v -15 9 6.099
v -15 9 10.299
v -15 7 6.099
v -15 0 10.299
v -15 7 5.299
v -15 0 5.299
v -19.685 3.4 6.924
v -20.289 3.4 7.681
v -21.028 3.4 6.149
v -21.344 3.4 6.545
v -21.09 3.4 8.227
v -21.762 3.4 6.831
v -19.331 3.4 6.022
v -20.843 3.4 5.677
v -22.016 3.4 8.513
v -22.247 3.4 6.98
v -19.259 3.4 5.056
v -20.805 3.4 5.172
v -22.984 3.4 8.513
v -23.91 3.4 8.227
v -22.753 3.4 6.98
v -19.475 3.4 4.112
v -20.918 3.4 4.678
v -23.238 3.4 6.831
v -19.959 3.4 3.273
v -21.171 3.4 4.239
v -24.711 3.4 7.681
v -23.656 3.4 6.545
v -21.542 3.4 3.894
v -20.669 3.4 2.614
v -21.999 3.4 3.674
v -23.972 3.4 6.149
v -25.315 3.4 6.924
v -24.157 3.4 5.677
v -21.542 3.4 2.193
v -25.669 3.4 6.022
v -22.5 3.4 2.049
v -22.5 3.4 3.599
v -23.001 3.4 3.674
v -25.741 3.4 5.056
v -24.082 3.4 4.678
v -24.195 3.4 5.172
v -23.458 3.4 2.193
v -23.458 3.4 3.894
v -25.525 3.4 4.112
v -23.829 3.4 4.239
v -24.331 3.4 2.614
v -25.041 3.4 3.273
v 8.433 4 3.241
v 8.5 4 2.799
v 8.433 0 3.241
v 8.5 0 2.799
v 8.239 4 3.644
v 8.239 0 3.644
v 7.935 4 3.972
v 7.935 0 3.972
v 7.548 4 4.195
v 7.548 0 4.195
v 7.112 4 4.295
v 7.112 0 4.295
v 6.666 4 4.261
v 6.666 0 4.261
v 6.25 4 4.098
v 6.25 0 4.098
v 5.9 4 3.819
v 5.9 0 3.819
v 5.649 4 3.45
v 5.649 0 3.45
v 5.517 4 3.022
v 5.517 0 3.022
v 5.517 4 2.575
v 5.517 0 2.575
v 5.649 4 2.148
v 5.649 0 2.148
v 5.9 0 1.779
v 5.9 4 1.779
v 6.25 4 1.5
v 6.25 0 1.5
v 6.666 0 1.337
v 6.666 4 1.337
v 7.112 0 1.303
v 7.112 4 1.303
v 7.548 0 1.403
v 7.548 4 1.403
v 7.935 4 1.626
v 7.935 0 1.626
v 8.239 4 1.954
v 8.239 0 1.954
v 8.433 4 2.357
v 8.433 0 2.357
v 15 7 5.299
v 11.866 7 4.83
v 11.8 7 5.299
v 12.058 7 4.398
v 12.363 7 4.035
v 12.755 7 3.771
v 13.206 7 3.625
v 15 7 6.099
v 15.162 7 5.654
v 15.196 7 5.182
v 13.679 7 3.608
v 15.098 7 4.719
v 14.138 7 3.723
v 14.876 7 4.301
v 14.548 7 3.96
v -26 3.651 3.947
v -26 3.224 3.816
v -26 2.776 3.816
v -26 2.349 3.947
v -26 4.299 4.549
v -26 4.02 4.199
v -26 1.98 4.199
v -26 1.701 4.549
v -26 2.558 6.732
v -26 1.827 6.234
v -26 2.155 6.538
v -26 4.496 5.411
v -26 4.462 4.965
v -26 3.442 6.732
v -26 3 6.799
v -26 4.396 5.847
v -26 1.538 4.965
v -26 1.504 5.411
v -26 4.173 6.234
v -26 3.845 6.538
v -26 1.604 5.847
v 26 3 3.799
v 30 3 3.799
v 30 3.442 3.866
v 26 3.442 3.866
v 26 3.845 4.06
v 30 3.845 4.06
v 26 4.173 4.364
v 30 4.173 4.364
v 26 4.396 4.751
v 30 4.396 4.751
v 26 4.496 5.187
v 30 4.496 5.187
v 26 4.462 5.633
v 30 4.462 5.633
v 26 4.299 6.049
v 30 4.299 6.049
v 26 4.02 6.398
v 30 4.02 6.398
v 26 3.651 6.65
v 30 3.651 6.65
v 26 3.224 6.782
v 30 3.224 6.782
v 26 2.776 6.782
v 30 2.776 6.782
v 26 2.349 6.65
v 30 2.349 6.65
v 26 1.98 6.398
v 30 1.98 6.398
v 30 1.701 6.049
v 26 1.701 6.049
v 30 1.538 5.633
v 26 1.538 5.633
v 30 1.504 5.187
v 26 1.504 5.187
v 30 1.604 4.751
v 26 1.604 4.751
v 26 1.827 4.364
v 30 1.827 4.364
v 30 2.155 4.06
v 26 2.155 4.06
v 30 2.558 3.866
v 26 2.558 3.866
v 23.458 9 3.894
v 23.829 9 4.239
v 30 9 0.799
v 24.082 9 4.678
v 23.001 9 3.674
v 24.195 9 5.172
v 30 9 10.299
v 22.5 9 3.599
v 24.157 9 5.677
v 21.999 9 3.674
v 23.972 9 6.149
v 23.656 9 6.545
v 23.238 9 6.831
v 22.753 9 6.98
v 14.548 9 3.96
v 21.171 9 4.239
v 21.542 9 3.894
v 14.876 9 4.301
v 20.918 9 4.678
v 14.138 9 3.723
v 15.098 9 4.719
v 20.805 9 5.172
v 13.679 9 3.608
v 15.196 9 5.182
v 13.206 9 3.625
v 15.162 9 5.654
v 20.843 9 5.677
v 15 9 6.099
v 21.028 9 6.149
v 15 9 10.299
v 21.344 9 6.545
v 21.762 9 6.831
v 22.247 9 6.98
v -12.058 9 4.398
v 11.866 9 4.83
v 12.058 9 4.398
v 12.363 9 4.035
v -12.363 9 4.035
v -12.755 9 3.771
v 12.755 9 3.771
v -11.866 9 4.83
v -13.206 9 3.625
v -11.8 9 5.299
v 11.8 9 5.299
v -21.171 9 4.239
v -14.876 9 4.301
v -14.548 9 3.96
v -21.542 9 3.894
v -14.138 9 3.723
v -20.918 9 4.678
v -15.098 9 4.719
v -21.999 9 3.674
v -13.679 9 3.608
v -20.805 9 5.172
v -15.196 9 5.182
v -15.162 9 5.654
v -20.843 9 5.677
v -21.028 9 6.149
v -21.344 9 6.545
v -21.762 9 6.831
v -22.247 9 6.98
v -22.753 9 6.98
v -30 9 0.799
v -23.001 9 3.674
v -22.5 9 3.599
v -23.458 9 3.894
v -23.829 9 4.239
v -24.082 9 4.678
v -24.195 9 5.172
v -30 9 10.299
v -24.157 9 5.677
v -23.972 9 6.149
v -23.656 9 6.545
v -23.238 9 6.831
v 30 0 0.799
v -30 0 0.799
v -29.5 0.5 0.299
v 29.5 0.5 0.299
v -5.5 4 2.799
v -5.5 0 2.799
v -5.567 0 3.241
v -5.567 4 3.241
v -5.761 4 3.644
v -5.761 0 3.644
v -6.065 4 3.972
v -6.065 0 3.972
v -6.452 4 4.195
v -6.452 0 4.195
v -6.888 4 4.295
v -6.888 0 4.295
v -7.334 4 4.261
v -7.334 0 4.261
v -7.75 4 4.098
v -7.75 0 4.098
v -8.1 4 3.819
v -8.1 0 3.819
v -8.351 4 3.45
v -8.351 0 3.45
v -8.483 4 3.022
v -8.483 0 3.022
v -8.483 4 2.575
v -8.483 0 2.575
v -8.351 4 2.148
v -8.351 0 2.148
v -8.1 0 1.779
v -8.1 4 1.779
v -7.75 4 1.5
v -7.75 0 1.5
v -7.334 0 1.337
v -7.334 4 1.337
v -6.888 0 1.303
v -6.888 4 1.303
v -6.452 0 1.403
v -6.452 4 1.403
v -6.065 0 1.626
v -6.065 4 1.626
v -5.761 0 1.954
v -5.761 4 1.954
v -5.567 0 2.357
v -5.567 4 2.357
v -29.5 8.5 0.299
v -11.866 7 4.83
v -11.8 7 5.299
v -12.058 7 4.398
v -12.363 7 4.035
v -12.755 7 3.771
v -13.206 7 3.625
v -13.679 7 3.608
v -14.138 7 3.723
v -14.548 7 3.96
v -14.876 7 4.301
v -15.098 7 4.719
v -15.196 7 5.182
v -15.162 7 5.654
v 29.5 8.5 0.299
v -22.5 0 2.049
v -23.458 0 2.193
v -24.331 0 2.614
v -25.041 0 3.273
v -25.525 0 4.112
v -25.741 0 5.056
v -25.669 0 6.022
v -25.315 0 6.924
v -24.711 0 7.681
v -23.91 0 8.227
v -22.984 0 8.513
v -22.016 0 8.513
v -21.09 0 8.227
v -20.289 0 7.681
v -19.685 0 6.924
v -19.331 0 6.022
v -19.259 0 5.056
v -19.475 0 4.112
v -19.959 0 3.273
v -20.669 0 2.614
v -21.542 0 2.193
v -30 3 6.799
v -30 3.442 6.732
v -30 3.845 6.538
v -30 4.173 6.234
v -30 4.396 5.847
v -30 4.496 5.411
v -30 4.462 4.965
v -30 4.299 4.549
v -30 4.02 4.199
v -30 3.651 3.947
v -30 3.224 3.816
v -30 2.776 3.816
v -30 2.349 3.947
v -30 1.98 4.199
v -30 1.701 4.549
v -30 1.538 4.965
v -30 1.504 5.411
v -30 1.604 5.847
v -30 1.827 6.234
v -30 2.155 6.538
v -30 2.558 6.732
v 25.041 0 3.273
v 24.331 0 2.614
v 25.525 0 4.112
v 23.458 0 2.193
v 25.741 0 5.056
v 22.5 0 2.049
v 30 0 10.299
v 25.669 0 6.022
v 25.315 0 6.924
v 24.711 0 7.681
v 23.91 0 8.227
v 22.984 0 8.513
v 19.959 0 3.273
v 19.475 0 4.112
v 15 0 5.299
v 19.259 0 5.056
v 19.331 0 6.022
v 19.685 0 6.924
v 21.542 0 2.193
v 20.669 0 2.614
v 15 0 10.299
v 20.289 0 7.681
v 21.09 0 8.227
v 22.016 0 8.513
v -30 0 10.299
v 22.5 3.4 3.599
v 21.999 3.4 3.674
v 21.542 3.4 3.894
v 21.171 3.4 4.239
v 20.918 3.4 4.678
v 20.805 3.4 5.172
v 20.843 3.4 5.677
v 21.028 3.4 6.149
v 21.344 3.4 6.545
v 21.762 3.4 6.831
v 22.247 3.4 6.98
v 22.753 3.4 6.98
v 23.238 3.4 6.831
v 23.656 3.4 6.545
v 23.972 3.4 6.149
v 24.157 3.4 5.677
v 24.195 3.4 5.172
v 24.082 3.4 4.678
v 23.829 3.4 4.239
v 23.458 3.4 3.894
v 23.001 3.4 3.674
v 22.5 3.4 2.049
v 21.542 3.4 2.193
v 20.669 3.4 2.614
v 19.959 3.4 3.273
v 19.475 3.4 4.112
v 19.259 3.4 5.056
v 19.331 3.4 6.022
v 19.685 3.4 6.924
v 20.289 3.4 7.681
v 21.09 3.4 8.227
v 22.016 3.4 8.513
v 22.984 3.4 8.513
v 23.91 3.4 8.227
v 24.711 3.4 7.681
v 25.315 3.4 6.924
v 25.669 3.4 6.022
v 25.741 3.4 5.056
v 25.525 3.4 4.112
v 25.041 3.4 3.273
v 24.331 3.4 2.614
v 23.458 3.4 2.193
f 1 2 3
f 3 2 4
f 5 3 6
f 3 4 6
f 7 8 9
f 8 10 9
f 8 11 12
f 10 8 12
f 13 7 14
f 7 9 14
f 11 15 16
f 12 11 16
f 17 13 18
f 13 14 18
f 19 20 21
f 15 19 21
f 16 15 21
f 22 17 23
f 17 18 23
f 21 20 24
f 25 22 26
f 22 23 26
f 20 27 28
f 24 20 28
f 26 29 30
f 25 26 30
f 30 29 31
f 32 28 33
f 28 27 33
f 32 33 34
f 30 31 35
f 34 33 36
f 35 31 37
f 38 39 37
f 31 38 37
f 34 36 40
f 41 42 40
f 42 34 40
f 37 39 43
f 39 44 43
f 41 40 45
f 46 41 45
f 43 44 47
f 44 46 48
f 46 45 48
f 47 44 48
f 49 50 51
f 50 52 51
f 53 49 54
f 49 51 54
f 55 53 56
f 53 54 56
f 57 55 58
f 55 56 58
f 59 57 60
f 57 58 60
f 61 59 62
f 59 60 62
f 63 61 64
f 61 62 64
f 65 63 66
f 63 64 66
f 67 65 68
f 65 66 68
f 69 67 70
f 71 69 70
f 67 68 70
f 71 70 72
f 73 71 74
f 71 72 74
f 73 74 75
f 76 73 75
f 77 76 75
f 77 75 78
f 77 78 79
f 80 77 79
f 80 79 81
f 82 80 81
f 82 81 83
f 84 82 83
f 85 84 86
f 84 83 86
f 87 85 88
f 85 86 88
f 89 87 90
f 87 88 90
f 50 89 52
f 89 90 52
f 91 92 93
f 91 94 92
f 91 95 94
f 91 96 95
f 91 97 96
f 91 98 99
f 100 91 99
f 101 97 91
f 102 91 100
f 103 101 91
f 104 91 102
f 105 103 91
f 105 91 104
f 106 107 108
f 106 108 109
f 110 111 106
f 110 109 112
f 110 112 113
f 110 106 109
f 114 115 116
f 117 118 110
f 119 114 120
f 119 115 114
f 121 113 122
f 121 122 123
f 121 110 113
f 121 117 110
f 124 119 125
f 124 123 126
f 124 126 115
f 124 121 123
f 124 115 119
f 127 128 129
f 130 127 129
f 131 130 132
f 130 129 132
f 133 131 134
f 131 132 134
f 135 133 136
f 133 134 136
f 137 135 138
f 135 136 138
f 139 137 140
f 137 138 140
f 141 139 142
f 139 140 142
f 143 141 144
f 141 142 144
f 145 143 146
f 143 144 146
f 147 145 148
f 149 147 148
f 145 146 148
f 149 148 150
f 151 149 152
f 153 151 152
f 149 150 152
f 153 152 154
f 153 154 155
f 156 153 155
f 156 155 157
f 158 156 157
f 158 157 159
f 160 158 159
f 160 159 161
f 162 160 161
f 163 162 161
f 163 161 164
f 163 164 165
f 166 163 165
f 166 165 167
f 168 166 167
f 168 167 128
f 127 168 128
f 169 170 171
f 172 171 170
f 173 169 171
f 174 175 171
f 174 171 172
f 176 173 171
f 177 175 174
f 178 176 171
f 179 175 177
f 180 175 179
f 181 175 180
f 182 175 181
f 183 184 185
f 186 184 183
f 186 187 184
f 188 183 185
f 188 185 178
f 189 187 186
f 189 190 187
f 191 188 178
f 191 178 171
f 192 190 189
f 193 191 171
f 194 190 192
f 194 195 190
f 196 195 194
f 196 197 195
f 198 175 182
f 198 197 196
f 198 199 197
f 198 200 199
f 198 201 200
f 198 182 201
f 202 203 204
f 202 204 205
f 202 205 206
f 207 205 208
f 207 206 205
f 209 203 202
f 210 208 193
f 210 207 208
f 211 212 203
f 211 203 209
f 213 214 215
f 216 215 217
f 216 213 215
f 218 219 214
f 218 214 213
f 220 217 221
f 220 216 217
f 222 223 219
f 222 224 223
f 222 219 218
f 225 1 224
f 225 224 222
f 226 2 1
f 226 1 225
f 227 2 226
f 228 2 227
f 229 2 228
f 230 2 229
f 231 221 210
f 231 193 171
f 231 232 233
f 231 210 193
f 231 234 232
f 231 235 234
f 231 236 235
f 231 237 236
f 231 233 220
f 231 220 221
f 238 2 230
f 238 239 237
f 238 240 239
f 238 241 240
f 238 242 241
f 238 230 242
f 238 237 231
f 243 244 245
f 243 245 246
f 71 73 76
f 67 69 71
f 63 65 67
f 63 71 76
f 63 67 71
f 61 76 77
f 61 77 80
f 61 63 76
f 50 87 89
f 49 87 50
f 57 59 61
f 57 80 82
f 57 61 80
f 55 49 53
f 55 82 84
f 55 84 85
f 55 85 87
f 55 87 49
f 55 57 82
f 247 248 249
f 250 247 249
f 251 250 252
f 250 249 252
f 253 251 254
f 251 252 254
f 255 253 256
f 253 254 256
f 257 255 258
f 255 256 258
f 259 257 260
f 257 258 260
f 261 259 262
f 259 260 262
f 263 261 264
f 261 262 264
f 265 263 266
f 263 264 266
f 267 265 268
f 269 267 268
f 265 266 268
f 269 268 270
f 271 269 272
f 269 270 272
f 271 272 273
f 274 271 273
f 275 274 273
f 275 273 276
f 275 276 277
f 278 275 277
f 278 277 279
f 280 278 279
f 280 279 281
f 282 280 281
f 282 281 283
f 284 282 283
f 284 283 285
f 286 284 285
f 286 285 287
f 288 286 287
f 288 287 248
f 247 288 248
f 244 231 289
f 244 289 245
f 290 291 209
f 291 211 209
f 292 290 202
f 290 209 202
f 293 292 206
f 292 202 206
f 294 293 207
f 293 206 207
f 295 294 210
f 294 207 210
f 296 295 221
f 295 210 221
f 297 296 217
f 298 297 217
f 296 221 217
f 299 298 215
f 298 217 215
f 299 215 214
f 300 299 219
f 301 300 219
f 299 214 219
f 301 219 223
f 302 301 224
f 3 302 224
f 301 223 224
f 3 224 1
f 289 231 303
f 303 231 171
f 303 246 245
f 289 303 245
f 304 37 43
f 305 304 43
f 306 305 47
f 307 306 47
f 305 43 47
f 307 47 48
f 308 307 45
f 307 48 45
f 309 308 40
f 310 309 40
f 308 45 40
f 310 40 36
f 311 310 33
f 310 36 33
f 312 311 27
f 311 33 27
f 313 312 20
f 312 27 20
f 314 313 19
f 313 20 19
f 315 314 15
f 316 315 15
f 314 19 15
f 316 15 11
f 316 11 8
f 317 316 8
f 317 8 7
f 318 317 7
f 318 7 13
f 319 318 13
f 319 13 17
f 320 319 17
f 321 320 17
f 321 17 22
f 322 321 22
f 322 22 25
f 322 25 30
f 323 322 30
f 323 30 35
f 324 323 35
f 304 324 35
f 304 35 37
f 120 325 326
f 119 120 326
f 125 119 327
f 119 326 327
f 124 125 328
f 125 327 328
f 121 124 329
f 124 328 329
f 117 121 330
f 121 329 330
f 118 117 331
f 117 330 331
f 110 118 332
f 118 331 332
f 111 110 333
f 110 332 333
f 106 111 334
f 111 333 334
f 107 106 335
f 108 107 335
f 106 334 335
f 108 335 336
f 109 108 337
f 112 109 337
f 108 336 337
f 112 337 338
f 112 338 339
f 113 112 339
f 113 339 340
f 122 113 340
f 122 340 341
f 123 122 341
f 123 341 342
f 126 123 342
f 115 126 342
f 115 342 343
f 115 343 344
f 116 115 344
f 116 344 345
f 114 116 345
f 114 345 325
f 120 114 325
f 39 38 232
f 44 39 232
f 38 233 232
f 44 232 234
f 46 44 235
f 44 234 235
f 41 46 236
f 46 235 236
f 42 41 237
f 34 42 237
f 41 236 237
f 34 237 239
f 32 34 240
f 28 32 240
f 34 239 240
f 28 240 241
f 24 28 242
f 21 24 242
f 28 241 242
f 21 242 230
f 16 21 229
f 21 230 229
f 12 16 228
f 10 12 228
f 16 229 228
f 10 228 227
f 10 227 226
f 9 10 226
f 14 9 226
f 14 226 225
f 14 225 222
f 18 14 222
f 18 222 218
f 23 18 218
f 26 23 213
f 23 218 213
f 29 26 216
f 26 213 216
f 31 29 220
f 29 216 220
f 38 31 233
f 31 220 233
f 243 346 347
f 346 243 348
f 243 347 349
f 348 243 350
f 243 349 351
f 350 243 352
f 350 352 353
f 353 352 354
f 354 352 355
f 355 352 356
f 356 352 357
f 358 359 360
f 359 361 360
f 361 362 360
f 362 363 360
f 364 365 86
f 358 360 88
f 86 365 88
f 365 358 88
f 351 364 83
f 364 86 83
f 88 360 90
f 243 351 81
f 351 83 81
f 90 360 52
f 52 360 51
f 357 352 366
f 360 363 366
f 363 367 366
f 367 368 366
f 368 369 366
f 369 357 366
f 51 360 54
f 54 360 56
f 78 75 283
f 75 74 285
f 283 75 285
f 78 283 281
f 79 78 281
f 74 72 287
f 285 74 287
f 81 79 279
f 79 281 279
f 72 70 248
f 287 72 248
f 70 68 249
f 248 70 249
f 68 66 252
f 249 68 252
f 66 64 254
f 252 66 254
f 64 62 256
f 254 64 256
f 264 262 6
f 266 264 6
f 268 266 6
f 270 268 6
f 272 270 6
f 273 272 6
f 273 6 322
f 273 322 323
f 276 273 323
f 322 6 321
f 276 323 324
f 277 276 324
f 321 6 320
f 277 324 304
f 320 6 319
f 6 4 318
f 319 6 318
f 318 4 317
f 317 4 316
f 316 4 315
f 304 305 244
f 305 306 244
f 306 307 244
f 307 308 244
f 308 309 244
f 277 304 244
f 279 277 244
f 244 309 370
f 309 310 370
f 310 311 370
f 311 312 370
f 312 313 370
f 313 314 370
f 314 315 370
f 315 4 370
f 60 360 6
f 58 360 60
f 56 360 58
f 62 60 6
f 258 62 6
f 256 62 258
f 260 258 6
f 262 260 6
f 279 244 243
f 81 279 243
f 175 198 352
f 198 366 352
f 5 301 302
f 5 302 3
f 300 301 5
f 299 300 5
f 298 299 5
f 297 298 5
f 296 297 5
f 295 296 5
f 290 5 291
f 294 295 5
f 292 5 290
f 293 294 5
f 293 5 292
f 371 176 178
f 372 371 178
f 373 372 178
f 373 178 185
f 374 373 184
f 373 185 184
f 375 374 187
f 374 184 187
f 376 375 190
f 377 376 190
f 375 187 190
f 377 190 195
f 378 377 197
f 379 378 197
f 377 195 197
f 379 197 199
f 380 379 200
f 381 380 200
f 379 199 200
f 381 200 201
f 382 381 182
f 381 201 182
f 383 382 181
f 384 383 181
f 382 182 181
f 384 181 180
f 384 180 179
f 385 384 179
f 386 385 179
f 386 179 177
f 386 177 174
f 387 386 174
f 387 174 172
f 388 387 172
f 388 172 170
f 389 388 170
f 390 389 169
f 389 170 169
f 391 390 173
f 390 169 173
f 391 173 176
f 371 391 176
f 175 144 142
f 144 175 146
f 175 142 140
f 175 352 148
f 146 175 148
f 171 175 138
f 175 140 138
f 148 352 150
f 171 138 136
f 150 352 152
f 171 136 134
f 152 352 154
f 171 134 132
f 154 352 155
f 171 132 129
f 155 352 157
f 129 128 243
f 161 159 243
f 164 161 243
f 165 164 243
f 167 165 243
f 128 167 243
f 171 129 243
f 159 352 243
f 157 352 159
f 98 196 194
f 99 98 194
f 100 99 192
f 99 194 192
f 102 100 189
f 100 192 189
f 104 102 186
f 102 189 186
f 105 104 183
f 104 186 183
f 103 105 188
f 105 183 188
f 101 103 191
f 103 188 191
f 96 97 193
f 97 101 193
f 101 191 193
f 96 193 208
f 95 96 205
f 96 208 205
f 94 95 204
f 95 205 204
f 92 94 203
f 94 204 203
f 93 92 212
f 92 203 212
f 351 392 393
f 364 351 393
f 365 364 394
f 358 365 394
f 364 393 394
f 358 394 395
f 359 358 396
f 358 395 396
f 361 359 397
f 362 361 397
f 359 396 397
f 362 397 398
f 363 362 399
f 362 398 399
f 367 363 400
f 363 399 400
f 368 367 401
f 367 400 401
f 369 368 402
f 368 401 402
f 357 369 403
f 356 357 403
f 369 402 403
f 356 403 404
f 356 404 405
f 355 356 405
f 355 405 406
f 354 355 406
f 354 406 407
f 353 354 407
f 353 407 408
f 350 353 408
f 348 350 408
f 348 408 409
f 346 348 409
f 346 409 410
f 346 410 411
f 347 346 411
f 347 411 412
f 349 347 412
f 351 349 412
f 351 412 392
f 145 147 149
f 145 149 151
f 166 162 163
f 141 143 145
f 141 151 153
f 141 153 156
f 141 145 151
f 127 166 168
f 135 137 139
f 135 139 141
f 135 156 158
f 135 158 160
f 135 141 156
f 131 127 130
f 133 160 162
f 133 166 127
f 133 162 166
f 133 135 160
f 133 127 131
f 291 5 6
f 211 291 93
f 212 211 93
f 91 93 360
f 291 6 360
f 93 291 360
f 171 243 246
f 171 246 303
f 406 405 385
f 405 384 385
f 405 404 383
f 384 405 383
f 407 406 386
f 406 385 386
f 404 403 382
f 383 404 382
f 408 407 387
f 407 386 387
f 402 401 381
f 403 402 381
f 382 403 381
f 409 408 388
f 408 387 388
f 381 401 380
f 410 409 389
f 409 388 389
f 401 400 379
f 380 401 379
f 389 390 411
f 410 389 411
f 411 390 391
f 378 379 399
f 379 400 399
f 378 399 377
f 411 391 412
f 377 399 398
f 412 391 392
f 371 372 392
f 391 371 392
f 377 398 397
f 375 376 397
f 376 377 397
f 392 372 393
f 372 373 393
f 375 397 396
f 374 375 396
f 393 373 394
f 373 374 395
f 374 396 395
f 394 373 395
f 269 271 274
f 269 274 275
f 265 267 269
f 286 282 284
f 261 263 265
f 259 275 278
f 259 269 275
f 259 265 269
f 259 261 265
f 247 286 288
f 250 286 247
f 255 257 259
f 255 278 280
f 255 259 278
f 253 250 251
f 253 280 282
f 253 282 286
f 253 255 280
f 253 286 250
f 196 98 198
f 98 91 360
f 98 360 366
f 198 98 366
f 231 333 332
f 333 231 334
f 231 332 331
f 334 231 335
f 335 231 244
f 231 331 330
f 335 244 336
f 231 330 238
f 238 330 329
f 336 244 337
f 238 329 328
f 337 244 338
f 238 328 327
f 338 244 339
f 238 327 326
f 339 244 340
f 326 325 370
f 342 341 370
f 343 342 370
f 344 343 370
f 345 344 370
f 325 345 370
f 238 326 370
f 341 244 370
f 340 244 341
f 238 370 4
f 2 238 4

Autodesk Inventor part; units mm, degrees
sketch "Skizze1" plane through (0, 0, 0) normal (0, 1, 0) x (-1, 0, 0)
  line L0 (30, 0.2989) -> (30, 10.2989)
  line L1 (30, 10.2989) -> (15, 10.2989)
  line L2 (15, 10.2989) -> (15, 5.2989)
  line L3 (15, 5.2989) -> (-15, 5.2989)
  line L4 (-15, 5.2989) -> (-15, 10.2989)
  line L5 (-15, 10.2989) -> (-30, 10.2989)
  line L6 (-30, 10.2989) -> (-30, 0.2989)
  line L7 (-30, 0.2989) -> (30, 0.2989)
  line L8 (0, -2.0598) -> (0, 12.3587) projected
  point P0 (0, 0)
  dimension "d0" = 30
  dimension "d1" = 5
  dimension "d2" = 15
  dimension "d3" = 15
  dimension "d4" = 15
  dimension "d5" = 5
extrude "Extrusion1" add sketch "Skizze1" along normal blind 9
sketch "Skizze2" plane through (30, 0, 10.2989) normal (1, 0, 0) x (0, 0, -1)
  circle A0 centre (5, 3) radius 1.5
  line L0 (0, 0) -> (0, 9) construction
  line L1 (0, 0) -> (10, 0) construction
  point P0 (10.2989, 0)
  dimension "d8" = 3
  dimension "d9" = 5
  dimension "d43" = 3
  dimension "d60" = 9
  dimension "d61" = 10
extrude "Extrusion2" cut sketch "Skizze2" against normal blind 4
sketch "Skizze4" plane through (-30, 0, 0.2989) normal (-1, 0, 0) x (0, 0, 1)
  circle A0 centre (5, 3) radius 1.5 projected
  circle A1 centre (5, 3) radius 1.5
  line L0 (10, 0) -> (10, 9) projected
  line L1 (0, 0) -> (10, 0) projected
  point P0 (-0.2989, 0)
  dimension "d21" = 5
  dimension "d22" = 3
  dimension "d63" = 3
extrude "Extrusion4" cut sketch "Skizze4" against normal blind 4
sketch "Skizze5" plane through (0, 0, 0) normal (0, 1, 0) x (1, 0, 0)
  circle A0 centre (-22.5, -5.2989) radius 1.5
  circle A1 centre (22.5, -5.2989) radius 1.5
  line L0 (-30, -10.2989) -> (-15, -10.2989) projected
  line L1 (-30, -0.2989) -> (-30, -10.2989) projected
  line L2 (30, -10.2989) -> (30, -0.2989) projected
  line L3 (15, -10.2989) -> (30, -10.2989) projected
  point P0 (0, 0)
  dimension "d25" = 5
  dimension "d26" = 7.5
  dimension "d27" = 7.5
  dimension "d28" = 5
  dimension "d29" = 3
  dimension "d30" = 3
hole "Bohrung1" at (-22.5, 0, 5.2989) at (22.5, 0, 5.2989) direction (0, 1, 0) diameter 3.4 end through all counterbore diameter 6.5 counterbore depth 3.4 clearance for "Inbusschraube DIN EN ISO 4762" size "M3" standard "DIN"
sketch "Skizze6" plane through (0, 0, 0) normal (0, -1, 0) x (1, 0, 0)
  circle A0 centre (-7, 2.7989) radius 1.5
  circle A1 centre (7, 2.7989) radius 1.5
  line L0 (-30, 0.2989) -> (-30, 10.2989) projected
  line L1 (-30, 10.2989) -> (-15, 10.2989) projected
  line L2 (15, 10.2989) -> (30, 10.2989) projected
  line L3 (30, 10.2989) -> (30, 0.2989) projected
  point P0 (0, 0)
  dimension "d33" = 3
  dimension "d34" = 3
  dimension "d36" = 7.5
  dimension "d37" = 7.5
  dimension "d41" = 7
  dimension "d42" = 7
extrude "Extrusion6" cut sketch "Skizze6" against normal blind 4
sketch "Skizze8" plane through (0, 9, 0) normal (0, 1, 0) x (1, 0, 0)
  circle A0 centre (-13.5, -5.2989) radius 1.7 projected
  circle A1 centre (13.5, -5.2989) radius 1.7 projected
  point P0 (0, 0)
extrude "Extrusion8" cut sketch "Skizze8" against normal blind 2
chamfer "Fase1" distance 0.5 angle 45 4 edges at (-30, 4.5, 0.2989) (0, 0, 0.2989) (0, 9, 0.2989) (30, 4.5, 0.2989)
equation "\"d2\" = 0.5 * d0"
equation "\"d9\" = 0.5 * d61"
equation "\"d33\" = d34"
equation "\"d42\" = d41"
properties part number "Fuehrungslagerhalter_v2" material "PBT-Kunststoff"
